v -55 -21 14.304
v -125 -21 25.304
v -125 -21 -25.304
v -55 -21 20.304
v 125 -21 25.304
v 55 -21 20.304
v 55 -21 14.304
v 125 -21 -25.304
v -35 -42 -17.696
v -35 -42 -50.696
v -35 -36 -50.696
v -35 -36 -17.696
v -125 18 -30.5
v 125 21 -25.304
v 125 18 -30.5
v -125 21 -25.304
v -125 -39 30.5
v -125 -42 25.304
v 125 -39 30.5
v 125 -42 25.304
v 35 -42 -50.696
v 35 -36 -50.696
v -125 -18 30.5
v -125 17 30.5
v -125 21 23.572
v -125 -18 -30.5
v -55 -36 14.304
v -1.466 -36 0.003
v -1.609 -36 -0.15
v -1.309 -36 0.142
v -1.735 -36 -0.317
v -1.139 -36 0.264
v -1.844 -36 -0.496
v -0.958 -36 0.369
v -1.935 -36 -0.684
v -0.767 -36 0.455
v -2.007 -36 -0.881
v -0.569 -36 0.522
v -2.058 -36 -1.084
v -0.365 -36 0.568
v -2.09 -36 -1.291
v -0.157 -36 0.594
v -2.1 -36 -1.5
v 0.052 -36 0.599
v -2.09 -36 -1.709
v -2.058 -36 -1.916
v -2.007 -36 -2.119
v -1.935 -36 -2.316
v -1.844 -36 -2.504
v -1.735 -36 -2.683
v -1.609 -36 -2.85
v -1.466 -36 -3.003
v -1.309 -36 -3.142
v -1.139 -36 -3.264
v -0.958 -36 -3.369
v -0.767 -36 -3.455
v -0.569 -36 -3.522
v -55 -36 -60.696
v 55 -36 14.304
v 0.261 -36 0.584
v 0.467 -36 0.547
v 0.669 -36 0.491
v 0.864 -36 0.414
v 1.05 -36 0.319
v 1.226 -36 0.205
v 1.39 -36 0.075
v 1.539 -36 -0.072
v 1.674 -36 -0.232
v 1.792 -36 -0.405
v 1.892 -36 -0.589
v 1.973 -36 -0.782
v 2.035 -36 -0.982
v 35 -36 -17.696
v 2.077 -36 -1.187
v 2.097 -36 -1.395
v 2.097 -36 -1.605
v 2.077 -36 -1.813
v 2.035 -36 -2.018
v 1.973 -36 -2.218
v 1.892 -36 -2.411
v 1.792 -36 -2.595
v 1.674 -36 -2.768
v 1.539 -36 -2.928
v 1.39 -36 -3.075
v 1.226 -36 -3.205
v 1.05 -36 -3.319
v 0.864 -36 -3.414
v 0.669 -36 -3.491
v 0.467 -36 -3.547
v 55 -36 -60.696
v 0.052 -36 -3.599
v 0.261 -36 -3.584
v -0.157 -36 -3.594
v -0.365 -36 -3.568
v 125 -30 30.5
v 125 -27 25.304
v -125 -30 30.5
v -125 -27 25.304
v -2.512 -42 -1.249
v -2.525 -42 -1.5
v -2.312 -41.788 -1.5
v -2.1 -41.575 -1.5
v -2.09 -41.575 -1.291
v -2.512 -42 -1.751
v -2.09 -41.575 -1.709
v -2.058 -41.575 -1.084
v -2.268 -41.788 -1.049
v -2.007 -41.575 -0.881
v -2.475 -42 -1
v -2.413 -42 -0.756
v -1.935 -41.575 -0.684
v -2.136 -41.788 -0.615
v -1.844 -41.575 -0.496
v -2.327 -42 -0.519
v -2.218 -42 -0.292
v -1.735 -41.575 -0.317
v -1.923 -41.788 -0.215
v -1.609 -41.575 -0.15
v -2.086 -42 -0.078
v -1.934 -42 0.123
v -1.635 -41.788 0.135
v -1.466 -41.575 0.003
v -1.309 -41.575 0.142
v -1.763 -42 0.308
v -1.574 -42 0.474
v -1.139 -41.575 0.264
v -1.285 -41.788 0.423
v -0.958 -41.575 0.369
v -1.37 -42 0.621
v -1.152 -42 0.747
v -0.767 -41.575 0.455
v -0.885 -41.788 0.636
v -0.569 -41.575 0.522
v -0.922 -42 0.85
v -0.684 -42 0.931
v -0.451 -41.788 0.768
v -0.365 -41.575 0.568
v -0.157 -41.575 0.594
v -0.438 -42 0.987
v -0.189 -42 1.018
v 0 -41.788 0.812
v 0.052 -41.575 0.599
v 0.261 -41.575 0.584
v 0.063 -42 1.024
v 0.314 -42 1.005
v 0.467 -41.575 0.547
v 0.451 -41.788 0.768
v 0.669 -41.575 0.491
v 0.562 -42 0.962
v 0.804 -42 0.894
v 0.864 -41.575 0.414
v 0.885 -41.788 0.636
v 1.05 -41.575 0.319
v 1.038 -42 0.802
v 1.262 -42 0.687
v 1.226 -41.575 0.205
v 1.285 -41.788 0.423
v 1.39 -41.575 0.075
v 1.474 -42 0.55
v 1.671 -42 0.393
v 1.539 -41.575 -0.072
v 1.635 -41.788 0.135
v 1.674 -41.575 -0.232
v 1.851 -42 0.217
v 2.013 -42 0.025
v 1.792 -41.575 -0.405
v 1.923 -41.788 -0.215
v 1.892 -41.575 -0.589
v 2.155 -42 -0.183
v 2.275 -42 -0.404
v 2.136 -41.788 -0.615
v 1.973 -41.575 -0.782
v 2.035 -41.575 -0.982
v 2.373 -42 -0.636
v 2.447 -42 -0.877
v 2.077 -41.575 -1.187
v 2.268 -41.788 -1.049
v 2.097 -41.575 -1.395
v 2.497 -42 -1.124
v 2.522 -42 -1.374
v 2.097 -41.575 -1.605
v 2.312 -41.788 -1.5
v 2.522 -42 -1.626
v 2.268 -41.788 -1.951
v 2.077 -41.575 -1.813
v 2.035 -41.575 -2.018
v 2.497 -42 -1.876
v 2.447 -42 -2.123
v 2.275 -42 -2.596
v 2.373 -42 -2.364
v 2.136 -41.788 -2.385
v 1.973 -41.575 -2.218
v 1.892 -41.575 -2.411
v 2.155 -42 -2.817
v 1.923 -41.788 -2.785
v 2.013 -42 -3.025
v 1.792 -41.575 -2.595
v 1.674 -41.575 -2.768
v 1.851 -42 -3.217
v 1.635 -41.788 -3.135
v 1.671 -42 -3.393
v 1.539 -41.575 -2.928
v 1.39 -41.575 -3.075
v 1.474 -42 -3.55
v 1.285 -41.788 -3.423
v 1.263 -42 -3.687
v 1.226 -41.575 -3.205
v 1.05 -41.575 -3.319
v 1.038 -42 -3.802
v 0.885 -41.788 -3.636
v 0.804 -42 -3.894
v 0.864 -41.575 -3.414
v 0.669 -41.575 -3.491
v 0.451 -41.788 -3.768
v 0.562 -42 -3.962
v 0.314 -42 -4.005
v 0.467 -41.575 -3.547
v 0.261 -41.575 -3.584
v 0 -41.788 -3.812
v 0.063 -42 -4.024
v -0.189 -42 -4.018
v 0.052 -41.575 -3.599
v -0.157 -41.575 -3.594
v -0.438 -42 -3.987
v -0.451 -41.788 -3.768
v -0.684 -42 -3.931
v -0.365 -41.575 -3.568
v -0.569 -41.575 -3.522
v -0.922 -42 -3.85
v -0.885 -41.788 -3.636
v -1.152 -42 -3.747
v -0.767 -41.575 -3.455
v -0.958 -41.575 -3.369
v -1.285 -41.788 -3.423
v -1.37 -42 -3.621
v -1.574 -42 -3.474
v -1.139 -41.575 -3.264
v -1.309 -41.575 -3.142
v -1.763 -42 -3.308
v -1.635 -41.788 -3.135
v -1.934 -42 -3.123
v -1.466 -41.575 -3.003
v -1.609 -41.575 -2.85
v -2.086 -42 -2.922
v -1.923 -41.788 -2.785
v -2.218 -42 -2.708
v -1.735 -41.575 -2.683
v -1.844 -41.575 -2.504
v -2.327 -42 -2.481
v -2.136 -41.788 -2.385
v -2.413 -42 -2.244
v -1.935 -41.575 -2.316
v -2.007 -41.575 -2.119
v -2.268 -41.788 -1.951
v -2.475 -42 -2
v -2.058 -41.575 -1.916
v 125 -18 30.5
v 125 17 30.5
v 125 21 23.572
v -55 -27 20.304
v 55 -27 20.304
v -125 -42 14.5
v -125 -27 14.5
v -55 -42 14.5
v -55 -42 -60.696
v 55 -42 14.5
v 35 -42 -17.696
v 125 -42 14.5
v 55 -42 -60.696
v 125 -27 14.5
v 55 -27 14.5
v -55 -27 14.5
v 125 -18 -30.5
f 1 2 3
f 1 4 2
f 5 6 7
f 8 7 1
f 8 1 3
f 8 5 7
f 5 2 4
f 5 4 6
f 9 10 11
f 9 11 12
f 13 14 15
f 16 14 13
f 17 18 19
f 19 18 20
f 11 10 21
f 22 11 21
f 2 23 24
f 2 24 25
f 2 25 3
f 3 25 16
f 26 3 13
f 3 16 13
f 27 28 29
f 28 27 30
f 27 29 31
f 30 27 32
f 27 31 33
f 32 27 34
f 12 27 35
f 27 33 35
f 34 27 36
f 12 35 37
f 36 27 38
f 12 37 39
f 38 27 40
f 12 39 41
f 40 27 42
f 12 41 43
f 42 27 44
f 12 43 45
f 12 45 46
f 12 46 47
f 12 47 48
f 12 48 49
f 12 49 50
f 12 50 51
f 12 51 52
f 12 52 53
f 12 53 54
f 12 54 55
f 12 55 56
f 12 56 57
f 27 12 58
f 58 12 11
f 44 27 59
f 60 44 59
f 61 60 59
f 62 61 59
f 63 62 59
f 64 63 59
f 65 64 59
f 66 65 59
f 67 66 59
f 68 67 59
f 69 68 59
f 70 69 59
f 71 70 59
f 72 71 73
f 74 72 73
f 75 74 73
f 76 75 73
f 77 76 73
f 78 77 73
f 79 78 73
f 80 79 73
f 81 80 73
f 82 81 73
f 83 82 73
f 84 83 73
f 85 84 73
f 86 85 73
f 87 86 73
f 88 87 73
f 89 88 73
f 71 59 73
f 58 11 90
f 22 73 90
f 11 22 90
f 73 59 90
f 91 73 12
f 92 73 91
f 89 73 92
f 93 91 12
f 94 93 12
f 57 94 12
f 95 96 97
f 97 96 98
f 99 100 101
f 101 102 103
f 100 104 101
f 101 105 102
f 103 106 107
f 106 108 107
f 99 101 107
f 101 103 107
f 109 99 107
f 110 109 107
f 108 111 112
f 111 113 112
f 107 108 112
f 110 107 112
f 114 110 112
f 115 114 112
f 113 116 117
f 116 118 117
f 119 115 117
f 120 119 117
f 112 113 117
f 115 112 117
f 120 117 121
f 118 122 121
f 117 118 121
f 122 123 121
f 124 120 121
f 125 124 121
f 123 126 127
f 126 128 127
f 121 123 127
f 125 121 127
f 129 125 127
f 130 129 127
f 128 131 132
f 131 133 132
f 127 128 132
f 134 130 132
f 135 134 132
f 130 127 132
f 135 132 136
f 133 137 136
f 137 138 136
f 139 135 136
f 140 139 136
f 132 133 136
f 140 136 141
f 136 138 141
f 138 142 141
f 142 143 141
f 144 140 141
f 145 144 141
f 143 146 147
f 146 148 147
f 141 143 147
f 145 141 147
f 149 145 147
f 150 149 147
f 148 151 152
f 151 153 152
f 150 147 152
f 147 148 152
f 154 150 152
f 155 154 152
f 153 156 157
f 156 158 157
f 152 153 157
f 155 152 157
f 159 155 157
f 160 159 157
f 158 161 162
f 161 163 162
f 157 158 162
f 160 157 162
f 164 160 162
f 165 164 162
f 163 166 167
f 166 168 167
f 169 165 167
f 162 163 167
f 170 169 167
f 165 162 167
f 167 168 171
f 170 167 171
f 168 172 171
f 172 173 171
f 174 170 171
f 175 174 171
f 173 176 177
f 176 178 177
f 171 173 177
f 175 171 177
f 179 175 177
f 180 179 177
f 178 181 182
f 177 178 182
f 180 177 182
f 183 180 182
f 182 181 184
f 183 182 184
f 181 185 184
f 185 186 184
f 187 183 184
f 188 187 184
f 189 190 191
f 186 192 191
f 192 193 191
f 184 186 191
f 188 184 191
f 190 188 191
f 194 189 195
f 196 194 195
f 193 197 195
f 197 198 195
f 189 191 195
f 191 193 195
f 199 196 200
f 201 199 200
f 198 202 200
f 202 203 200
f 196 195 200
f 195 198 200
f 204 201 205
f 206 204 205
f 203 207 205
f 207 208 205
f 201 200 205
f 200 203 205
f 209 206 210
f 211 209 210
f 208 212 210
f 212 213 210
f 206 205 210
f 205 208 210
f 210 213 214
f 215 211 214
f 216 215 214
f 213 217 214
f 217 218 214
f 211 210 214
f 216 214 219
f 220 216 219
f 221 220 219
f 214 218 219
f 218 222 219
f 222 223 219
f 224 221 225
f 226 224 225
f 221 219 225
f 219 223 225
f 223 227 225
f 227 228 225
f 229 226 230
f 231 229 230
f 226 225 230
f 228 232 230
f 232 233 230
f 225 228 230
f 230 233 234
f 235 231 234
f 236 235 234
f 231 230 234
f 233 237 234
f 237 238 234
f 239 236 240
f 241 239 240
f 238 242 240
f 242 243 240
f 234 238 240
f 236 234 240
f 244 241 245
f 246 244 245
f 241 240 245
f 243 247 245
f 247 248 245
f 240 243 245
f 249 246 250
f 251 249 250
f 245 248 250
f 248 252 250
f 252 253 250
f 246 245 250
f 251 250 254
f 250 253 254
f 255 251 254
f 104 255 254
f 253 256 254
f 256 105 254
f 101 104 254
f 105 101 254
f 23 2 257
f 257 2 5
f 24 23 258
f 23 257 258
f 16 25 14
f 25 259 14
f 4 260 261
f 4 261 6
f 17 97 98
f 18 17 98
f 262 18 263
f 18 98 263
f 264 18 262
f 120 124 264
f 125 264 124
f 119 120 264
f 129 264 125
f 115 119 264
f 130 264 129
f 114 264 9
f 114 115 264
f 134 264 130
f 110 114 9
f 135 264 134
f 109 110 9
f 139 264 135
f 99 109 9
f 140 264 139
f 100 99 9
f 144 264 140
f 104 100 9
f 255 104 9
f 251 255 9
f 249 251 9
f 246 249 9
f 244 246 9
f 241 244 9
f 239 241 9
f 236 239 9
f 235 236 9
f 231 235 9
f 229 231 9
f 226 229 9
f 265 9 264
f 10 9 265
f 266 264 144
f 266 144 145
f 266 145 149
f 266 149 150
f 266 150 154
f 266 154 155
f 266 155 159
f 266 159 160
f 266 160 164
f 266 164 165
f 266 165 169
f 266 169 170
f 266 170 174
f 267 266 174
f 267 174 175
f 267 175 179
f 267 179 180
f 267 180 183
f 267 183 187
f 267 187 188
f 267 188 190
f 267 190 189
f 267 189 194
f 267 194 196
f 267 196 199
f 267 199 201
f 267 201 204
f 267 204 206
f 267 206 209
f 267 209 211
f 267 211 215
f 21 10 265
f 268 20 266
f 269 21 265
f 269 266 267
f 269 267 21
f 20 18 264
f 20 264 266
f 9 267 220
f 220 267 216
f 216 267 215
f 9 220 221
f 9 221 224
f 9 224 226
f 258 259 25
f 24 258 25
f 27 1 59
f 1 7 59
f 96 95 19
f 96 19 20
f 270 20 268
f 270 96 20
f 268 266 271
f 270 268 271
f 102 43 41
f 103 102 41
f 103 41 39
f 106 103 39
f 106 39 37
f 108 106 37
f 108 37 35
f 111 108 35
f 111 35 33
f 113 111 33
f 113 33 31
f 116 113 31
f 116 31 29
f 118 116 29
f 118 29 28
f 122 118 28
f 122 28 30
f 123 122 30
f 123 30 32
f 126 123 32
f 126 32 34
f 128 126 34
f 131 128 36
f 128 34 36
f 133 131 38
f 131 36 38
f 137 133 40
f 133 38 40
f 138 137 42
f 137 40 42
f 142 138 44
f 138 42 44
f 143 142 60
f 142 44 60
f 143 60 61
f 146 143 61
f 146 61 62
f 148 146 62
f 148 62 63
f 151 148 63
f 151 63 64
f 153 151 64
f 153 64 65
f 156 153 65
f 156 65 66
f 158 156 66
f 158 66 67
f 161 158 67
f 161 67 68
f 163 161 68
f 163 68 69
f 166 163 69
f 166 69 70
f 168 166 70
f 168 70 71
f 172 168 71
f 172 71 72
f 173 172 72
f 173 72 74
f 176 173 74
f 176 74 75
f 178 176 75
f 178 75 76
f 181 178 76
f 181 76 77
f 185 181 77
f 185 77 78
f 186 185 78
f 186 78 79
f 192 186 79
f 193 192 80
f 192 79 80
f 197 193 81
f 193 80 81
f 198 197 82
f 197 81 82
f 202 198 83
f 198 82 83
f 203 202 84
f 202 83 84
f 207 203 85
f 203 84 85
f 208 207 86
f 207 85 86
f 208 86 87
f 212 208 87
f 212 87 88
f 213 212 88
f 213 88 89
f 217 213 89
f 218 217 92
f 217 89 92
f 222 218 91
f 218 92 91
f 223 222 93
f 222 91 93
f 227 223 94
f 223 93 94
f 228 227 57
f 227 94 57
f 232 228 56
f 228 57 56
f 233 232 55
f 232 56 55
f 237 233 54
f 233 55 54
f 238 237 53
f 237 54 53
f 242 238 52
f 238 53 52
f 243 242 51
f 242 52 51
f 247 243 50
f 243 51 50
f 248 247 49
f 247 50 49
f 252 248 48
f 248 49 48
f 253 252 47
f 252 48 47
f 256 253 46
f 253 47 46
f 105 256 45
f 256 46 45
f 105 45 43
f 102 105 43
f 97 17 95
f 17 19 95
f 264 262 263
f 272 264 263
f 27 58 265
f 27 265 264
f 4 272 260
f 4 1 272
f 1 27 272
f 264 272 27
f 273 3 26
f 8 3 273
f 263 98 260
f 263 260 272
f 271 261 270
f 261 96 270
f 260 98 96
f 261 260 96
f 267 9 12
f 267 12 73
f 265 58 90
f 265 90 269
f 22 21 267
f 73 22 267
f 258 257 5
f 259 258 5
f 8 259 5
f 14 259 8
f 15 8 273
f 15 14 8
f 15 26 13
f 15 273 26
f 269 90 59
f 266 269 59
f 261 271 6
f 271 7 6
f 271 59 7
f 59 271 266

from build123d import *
from OCP.BRepFilletAPI import BRepFilletAPI_MakeChamfer

# Parameters (mm, degrees)
SKETCH_1_W                   = 61
SKETCH_1_H                   = 42
EXTRUDE_1_DEPTH              = 125
CHAMFER_1_SIZE               = 4
CHAMFER_1_SIZE2              = 6.92820323
CHAMFER_2_SIZE               = 3
CHAMFER_2_SIZE2              = 5.196152423
EXTRUDE_2_DEPTH              = 55
SKETCH_4_W                   = 16
SKETCH_4_H                   = 15
EXTRUDE_3_DEPTH              = 125
CHAMFER_3_SIZE               = 3
CHAMFER_3_SIZE2              = 5.196152423
CUT_EXTRUDE_1_REACH          = 154.571
SKETCH_5_W                   = 70
SKETCH_5_H                   = 33
HOLE_WIZARD_M5_1_D           = 4.2
HOLE_WIZARD_M5_1_DEPTH       = 6
HOLE_WIZARD_M5_1_CSINK_D     = 5.05
HOLE_WIZARD_M5_1_CSINK_ANGLE = 90


with BuildPart() as part:
    # 草图1 → 凸台-拉伸1 (new, symmetric)
    with BuildSketch(Plane(origin=(0, 0, 0), x_dir=(0, 0, -1), z_dir=(1, 0, 0))):
        Rectangle(SKETCH_1_W, SKETCH_1_H)
    extrude(amount=EXTRUDE_1_DEPTH, both=True)

    # 倒角1
    chamfer_1_edges = [part.edges().sort_by_distance(p)[0] for p in [
        (0, 21, 30.5),
    ]]
    chamfer_1_side = [part.faces().sort_by_distance(p)[0] for p in [
        (0, 0, 30.5),
    ]]
    chamfer(chamfer_1_edges, length=CHAMFER_1_SIZE, length2=CHAMFER_1_SIZE2, reference=chamfer_1_side[0])

    # 倒角2: one chamfer whose edges measure the first distance from different faces: ONE call of the kernel's chamfer builder (chamfer() names one face for all edges)
    chamfer_2_edges_1 = [part.edges().sort_by_distance(p)[0] for p in [
        (0, 21, -30.5),
        (0, -21, -30.5),
    ]]
    chamfer_2_side_1 = [part.faces().sort_by_distance(p)[0] for p in [
        (0, 0, -30.5),
    ]]
    chamfer_2_edges_2 = [part.edges().sort_by_distance(p)[0] for p in [
        (0, -21, 30.5),
    ]]
    chamfer_2_side_2 = [part.faces().sort_by_distance(p)[0] for p in [
        (0, -2, 30.5),
    ]]
    chamfer_2 = BRepFilletAPI_MakeChamfer(part.part.solid().wrapped)
    for e in chamfer_2_edges_1:
        chamfer_2.Add(CHAMFER_2_SIZE, CHAMFER_2_SIZE2, e.wrapped, chamfer_2_side_1[0].wrapped)  # the first distance lies on this face
    for e in chamfer_2_edges_2:
        chamfer_2.Add(CHAMFER_2_SIZE, CHAMFER_2_SIZE2, e.wrapped, chamfer_2_side_2[0].wrapped)  # the first distance lies on this face
    add(Compound.cast(chamfer_2.Shape()), mode=Mode.REPLACE)

    # 草图3 → 凸台-拉伸2 (add, symmetric)
    with BuildSketch(Plane(origin=(0, 0, 0), x_dir=(0, 0, -1), z_dir=(1, 0, 0))):
        Polygon((-20.303847577, -21), (-14.303847577, -21), (-14.303847577, -36), (60.696152423, -36), (60.696152423, -42), (-14.303847577, -42), (-20.303847577, -42), align=None)
    extrude(amount=EXTRUDE_2_DEPTH, both=True)

    # 草图4 → 凸台-拉伸3 (add, symmetric)
    with BuildSketch(Plane(origin=(0, 0, 0), x_dir=(0, 0, -1), z_dir=(1, 0, 0))):
        with Locations((-22.5, -34.5)):
            Rectangle(SKETCH_4_W, SKETCH_4_H)
    extrude(amount=EXTRUDE_3_DEPTH, both=True)

    # 倒角3
    chamfer_3_edges = [part.edges().sort_by_distance(p)[0] for p in [
        (0, -27, 30.5),
        (0, -42, 30.5),
    ]]
    chamfer_3_side = [part.faces().sort_by_distance(p)[0] for p in [
        (0, -34.5, 30.5),
    ]]
    chamfer(chamfer_3_edges, length=CHAMFER_3_SIZE, length2=CHAMFER_3_SIZE2, reference=chamfer_3_side[0])

    # 草图5 → 切除-拉伸1 (cut, up to next)
    with BuildSketch(Plane.XZ.offset(42), mode=Mode.PRIVATE) as cut_extrude_1_sk1:
        with Locations((0, -34.196152423)):
            Rectangle(SKETCH_5_W, SKETCH_5_H)
    cut_extrude_1_tool1 = extrude(cut_extrude_1_sk1.sketch, amount=-CUT_EXTRUDE_1_REACH, mode=Mode.PRIVATE) & part.part
    add(cut_extrude_1_tool1.solids().sort_by_distance((0, -42, -34.196152))[0], mode=Mode.SUBTRACT)

    # M5 螺纹孔1
    with Locations(Plane.XZ.offset(42)):
        with Locations((0, -1.5)):
            CounterSinkHole(HOLE_WIZARD_M5_1_D / 2, HOLE_WIZARD_M5_1_CSINK_D / 2, depth=HOLE_WIZARD_M5_1_DEPTH, counter_sink_angle=HOLE_WIZARD_M5_1_CSINK_ANGLE)


solid = part.part
